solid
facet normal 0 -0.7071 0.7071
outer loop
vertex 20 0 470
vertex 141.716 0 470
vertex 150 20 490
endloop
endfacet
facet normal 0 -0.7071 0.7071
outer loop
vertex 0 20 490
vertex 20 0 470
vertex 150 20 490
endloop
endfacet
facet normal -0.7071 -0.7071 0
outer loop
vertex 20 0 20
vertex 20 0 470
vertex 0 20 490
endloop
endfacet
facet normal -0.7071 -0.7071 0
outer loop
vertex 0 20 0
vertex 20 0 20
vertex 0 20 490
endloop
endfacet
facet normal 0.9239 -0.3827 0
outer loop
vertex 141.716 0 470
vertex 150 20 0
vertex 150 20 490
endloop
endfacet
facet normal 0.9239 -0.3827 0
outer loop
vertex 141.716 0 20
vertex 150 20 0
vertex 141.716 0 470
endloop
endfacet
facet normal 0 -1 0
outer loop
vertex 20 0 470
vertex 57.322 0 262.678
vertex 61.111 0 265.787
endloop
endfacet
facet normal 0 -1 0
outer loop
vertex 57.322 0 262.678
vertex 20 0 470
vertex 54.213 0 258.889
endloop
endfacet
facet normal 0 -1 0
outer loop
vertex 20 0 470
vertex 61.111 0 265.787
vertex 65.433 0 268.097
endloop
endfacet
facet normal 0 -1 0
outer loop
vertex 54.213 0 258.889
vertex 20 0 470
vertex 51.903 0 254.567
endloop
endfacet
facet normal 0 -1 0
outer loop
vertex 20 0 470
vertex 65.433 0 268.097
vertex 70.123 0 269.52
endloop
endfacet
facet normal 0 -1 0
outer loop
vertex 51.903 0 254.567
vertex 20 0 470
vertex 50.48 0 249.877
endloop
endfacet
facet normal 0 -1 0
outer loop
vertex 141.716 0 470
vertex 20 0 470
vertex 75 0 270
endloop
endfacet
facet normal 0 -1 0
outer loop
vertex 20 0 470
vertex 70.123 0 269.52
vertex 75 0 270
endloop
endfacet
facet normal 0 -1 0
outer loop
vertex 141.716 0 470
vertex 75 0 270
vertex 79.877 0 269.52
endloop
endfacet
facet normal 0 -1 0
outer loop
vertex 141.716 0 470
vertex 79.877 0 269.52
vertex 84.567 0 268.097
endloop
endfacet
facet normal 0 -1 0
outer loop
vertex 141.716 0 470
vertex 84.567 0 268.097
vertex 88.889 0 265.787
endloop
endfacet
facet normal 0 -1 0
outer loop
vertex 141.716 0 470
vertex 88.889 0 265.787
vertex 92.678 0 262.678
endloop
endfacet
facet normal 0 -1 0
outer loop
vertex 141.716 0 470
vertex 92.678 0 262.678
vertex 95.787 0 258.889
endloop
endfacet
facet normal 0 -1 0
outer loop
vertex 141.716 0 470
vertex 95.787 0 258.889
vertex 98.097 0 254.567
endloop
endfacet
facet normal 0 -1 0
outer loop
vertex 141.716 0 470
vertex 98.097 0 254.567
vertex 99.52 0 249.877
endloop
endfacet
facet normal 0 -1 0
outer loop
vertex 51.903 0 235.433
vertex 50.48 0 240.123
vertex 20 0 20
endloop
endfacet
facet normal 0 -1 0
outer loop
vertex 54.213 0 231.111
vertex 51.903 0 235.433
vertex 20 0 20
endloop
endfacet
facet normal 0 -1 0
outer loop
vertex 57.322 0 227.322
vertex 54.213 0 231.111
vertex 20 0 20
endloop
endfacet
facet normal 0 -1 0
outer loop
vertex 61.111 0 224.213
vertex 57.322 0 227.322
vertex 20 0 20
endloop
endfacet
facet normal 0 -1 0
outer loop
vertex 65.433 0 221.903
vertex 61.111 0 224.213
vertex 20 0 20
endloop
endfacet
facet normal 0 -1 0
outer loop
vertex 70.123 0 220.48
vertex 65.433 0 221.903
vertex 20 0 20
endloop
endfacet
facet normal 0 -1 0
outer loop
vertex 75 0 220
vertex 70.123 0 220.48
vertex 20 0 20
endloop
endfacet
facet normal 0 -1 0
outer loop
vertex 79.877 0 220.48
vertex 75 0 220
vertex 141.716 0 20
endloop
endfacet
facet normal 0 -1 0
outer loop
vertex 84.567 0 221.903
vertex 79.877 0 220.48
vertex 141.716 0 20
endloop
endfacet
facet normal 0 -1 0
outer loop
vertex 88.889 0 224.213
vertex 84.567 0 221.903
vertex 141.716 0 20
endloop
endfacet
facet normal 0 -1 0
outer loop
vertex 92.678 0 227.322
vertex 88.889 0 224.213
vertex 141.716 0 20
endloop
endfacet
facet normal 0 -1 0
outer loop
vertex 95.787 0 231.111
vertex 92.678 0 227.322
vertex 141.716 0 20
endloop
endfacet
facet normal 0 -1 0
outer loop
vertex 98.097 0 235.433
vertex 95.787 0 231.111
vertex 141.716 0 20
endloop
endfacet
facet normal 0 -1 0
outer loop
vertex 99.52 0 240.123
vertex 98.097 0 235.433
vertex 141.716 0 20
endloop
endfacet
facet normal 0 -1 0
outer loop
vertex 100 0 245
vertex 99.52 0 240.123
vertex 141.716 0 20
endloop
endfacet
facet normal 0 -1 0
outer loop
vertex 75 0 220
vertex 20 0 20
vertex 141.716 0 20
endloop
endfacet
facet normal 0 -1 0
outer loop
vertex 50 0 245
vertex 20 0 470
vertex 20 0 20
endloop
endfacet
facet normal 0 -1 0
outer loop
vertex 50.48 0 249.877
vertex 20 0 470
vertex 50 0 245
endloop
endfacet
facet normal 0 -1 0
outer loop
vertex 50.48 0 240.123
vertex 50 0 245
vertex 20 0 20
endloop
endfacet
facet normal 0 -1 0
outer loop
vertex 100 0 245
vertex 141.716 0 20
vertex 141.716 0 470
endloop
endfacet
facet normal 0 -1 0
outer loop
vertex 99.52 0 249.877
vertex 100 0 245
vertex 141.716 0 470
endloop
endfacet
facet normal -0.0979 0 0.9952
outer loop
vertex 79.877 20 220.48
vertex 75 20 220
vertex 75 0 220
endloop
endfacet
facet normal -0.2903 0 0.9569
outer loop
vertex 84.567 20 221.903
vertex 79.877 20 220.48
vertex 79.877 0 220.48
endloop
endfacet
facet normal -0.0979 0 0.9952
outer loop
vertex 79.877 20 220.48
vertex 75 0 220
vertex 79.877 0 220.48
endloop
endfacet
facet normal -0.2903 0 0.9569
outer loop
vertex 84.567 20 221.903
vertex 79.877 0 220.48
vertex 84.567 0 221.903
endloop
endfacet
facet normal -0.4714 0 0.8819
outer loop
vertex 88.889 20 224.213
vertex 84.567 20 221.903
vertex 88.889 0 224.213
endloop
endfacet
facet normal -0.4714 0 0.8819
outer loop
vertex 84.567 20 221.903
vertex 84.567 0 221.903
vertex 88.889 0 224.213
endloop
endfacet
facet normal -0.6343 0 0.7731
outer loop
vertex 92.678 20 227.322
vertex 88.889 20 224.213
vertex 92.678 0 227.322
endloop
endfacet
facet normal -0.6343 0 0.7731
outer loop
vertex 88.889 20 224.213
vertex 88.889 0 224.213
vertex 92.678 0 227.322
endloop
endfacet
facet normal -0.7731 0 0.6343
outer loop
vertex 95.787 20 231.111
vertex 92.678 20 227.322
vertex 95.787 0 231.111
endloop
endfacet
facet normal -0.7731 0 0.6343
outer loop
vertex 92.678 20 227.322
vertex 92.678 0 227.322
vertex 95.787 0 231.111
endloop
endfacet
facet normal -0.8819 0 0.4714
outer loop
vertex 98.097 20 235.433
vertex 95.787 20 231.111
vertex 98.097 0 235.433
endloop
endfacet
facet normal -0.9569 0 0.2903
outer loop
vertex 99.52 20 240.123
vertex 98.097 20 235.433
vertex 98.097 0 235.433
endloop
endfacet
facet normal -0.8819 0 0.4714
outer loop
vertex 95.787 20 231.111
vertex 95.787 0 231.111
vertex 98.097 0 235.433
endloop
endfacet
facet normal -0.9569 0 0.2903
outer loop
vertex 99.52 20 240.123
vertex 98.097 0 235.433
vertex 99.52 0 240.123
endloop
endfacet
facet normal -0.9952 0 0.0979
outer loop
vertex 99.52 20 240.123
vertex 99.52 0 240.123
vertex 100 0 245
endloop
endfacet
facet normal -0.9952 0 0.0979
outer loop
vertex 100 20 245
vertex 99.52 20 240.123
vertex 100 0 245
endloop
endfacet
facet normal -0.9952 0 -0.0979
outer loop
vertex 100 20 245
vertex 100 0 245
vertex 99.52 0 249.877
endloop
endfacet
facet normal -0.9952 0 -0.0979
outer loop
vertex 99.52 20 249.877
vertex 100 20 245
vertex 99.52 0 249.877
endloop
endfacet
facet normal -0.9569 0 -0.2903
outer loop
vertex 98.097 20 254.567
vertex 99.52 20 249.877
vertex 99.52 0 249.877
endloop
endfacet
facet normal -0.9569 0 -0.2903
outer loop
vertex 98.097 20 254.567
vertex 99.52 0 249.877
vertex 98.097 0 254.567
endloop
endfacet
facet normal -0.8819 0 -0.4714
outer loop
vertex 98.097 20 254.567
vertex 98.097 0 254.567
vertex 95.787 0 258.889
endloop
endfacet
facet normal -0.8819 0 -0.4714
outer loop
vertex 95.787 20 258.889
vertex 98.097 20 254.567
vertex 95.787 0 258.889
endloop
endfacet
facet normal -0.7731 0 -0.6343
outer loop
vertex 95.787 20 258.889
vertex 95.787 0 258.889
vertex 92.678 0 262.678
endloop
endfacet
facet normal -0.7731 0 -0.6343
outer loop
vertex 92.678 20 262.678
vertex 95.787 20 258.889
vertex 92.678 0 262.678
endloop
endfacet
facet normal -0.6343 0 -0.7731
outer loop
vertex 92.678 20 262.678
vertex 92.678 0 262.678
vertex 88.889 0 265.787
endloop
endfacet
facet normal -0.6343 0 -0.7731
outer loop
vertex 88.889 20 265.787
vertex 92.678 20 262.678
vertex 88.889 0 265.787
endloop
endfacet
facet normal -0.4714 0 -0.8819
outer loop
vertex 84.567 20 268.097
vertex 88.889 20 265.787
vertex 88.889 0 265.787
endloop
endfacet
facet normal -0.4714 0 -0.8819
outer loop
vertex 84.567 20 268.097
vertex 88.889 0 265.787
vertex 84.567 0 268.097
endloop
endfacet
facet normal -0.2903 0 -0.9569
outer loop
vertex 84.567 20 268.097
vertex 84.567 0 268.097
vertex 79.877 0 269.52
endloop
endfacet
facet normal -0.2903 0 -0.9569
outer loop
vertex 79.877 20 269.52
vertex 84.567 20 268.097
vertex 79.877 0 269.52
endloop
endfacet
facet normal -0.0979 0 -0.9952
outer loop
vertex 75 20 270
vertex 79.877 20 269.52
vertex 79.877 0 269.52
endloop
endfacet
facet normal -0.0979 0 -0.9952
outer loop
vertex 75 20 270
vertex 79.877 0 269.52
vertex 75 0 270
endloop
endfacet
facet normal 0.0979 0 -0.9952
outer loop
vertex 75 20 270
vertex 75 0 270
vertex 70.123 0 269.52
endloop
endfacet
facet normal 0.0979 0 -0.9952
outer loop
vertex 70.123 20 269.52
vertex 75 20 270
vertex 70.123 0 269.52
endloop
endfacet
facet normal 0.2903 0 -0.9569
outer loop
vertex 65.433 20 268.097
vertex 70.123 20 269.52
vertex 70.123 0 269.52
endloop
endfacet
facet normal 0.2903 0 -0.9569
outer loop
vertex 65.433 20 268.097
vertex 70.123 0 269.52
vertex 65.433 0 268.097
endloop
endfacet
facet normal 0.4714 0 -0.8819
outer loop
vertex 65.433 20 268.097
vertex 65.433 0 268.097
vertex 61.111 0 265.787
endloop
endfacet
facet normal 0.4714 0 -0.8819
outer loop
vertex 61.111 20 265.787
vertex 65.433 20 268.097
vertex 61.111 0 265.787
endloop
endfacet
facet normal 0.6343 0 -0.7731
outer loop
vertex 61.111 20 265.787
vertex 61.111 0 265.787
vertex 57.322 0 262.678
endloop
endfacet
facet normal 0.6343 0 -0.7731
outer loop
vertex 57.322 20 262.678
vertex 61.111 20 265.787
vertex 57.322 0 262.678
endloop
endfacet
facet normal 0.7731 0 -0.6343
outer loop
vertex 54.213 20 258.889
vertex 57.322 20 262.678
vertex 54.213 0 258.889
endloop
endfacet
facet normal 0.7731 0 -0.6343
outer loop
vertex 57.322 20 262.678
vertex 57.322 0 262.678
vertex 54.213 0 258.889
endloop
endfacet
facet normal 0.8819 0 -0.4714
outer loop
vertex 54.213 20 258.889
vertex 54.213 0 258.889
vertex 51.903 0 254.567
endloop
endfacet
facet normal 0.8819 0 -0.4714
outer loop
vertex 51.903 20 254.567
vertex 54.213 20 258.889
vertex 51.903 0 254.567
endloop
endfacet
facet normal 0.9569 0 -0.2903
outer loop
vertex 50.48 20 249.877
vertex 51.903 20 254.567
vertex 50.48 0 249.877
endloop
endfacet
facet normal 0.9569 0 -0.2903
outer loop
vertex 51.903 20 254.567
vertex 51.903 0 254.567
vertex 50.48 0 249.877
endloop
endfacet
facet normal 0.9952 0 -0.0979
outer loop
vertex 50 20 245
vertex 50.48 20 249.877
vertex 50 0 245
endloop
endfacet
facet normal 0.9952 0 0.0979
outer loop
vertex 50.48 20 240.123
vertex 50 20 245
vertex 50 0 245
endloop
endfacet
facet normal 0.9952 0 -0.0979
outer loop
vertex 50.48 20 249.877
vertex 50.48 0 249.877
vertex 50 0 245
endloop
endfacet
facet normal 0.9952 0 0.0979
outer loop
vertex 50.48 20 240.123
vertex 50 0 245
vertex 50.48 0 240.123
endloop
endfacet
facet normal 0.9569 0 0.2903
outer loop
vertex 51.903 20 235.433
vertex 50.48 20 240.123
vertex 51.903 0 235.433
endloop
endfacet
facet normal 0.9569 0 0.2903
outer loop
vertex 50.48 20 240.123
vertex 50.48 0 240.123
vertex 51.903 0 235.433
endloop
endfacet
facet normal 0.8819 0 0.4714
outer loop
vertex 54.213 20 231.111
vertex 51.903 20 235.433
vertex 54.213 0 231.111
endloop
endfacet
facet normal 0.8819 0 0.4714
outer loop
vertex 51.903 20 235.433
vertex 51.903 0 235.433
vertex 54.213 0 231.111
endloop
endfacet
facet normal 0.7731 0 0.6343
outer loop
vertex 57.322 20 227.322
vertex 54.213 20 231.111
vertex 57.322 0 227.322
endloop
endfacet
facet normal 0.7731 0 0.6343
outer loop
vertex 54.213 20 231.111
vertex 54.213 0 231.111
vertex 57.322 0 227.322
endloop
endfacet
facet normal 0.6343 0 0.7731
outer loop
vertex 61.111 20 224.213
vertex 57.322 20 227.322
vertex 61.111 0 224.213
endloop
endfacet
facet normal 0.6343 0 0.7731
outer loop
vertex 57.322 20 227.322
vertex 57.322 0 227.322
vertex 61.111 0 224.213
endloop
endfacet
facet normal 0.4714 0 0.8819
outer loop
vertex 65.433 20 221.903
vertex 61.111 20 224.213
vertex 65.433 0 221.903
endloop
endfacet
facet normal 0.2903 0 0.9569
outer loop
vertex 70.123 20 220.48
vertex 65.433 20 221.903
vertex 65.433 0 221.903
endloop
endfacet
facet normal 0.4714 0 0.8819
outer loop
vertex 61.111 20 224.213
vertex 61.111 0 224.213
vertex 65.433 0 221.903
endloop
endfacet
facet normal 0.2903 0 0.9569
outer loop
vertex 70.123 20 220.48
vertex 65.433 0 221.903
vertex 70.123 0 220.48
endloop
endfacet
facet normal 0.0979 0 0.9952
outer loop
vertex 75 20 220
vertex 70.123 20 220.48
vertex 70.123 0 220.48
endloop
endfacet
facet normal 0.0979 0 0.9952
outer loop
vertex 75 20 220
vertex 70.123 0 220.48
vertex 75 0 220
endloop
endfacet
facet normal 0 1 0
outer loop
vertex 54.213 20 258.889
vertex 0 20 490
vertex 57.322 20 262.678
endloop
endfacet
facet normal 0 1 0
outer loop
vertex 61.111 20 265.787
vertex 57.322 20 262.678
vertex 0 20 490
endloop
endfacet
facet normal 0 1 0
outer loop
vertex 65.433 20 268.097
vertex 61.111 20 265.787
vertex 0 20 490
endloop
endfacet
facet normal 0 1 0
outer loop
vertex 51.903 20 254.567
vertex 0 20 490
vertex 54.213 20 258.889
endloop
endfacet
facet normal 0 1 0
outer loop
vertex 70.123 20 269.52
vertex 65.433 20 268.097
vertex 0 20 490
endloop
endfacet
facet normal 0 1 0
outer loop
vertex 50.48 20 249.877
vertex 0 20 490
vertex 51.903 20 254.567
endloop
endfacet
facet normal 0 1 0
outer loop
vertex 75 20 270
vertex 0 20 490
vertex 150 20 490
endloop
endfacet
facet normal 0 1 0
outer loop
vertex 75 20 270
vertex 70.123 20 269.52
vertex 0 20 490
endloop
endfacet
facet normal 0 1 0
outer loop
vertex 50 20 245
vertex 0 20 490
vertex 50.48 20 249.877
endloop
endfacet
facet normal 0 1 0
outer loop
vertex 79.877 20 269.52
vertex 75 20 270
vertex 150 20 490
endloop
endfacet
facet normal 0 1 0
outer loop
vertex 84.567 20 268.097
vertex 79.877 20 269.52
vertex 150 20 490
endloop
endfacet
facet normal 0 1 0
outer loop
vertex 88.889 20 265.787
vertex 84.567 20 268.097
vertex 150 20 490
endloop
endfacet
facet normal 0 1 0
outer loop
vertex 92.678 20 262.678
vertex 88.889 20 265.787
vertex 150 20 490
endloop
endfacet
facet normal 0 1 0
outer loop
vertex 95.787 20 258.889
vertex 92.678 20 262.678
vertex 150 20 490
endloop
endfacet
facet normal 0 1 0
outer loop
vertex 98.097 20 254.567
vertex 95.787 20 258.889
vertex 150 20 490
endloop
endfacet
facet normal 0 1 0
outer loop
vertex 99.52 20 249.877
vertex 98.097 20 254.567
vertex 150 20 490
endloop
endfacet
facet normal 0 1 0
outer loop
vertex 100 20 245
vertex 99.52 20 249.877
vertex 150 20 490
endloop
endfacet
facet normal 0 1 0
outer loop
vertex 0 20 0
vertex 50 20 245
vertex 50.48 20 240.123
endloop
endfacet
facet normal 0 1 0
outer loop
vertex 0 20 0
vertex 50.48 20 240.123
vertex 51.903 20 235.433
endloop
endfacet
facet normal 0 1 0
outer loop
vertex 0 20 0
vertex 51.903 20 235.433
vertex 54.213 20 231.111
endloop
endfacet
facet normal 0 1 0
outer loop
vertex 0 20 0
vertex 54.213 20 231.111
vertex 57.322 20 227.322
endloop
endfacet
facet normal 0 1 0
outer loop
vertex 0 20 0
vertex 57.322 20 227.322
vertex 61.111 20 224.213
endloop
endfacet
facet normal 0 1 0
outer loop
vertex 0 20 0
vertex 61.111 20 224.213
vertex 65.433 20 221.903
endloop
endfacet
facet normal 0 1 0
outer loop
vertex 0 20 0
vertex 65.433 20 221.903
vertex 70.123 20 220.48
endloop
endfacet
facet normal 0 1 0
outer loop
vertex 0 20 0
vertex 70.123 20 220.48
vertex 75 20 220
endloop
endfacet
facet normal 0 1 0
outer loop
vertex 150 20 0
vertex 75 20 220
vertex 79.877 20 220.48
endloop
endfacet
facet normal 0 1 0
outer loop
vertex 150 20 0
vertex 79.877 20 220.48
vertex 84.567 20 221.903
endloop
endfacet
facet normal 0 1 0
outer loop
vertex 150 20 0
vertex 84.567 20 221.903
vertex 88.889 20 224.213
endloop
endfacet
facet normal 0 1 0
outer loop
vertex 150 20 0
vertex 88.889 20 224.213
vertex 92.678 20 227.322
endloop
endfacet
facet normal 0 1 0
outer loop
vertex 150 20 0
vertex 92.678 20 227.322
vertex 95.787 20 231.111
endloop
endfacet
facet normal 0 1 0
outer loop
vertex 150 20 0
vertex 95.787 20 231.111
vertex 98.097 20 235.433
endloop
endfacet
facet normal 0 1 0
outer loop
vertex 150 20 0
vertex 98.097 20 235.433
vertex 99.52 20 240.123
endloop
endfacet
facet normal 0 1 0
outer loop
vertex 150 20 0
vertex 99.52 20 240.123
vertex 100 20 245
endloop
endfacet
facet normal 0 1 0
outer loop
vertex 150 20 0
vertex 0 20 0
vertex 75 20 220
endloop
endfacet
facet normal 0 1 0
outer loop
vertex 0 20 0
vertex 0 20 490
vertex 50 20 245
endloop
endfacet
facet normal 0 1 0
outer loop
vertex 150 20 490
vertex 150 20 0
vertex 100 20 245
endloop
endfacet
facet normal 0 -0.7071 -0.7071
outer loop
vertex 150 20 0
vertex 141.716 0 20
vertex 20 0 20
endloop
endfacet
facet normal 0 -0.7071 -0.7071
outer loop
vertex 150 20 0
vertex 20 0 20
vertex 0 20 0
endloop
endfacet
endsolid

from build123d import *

# Parameters (mm, degrees)
ESBO_O1_W                = 150
ESBO_O1_H                = 20
RESSALTO_EXTRUS_O1_DEPTH = 490
CHANFRO1_SIZE            = 20
ESBO_O2_R                = 25
CORTE_EXTRUS_O1_DEPTH    = 513.835256198
CHANFRO2_SIZE2           = 20
CHANFRO2_SIZE            = 8.284271247


# Some blends are built 0.0001 mm under size
with BuildPart() as part:
    # Esboço1 → Ressalto-extrusão1 (new body)
    with BuildSketch(Plane.XY):
        with Locations((75, 10)):
            Rectangle(ESBO_O1_W, ESBO_O1_H)
    extrude(amount=RESSALTO_EXTRUS_O1_DEPTH)

    # Chanfro1
    # the kernel refuses this chamfer: 20 mm, written as the material it takes off along each edge
    with BuildSketch(Plane(origin=(-51.433659759, 0, 490), x_dir=(0, -0.027495876610586334, -0.9996219169112968), z_dir=(1, 0, 0))) as chanfro1_piece_1:
        Polygon((CHANFRO1_SIZE * 0.999621916911, CHANFRO1_SIZE * 0.0274958766106), (-CHANFRO1_SIZE * 0.0274958766106, CHANFRO1_SIZE * 0.999621916911), (0, 0), align=None)
    extrude(amount=252.867319519, mode=Mode.SUBTRACT)
    with BuildSketch(Plane(origin=(0, 0, -51.433659759), x_dir=(0.9996219169112968, -0.027495876610586372, 0), z_dir=(0, 0, 1))) as chanfro1_piece_2:
        Polygon((CHANFRO1_SIZE * 0.999621916911, CHANFRO1_SIZE * 0.0274958766106), (-CHANFRO1_SIZE * 0.0274958766106, CHANFRO1_SIZE * 0.999621916911), (0, 0), align=None)
    extrude(amount=592.867319519, mode=Mode.SUBTRACT)
    with BuildSketch(Plane(origin=(-51.433659759, 0, 0), x_dir=(0, -0.027495876610586372, 0.9996219169112968), z_dir=(1, 0, 0))) as chanfro1_piece_3:
        Polygon((CHANFRO1_SIZE * 0.999621916911, -CHANFRO1_SIZE * 0.0274958766106), (-CHANFRO1_SIZE * 0.0274958766106, -CHANFRO1_SIZE * 0.999621916911), (0, 0), align=None)
    extrude(amount=252.867319519, mode=Mode.SUBTRACT)

    # Esboço2 → Corte-extrusão1 (cut, through all)
    with BuildSketch(Plane(origin=(0, 0, 0), x_dir=(-1, 0, 0), z_dir=(0, -1, 0))):
        with Locations(Location((-75, -245, 0), (0, 0, 90))):
            Circle(ESBO_O2_R)
    extrude(amount=-CORTE_EXTRUS_O1_DEPTH, mode=Mode.SUBTRACT)

    # Chanfro2
    chanfro2_edges = [part.edges().sort_by_distance(p)[0] for p in [
        (150, 0, 245),
    ]]
    chanfro2_side = [part.faces().sort_by_distance(p)[0] for p in [
        (149.834314575, 0, 245),
    ]]
    chamfer(chanfro2_edges, length=CHANFRO2_SIZE - 0.0001, length2=CHANFRO2_SIZE2 - 0.0001, reference=chanfro2_side[0])  # a hair under: the kernel refuses the full size


solid = part.part
